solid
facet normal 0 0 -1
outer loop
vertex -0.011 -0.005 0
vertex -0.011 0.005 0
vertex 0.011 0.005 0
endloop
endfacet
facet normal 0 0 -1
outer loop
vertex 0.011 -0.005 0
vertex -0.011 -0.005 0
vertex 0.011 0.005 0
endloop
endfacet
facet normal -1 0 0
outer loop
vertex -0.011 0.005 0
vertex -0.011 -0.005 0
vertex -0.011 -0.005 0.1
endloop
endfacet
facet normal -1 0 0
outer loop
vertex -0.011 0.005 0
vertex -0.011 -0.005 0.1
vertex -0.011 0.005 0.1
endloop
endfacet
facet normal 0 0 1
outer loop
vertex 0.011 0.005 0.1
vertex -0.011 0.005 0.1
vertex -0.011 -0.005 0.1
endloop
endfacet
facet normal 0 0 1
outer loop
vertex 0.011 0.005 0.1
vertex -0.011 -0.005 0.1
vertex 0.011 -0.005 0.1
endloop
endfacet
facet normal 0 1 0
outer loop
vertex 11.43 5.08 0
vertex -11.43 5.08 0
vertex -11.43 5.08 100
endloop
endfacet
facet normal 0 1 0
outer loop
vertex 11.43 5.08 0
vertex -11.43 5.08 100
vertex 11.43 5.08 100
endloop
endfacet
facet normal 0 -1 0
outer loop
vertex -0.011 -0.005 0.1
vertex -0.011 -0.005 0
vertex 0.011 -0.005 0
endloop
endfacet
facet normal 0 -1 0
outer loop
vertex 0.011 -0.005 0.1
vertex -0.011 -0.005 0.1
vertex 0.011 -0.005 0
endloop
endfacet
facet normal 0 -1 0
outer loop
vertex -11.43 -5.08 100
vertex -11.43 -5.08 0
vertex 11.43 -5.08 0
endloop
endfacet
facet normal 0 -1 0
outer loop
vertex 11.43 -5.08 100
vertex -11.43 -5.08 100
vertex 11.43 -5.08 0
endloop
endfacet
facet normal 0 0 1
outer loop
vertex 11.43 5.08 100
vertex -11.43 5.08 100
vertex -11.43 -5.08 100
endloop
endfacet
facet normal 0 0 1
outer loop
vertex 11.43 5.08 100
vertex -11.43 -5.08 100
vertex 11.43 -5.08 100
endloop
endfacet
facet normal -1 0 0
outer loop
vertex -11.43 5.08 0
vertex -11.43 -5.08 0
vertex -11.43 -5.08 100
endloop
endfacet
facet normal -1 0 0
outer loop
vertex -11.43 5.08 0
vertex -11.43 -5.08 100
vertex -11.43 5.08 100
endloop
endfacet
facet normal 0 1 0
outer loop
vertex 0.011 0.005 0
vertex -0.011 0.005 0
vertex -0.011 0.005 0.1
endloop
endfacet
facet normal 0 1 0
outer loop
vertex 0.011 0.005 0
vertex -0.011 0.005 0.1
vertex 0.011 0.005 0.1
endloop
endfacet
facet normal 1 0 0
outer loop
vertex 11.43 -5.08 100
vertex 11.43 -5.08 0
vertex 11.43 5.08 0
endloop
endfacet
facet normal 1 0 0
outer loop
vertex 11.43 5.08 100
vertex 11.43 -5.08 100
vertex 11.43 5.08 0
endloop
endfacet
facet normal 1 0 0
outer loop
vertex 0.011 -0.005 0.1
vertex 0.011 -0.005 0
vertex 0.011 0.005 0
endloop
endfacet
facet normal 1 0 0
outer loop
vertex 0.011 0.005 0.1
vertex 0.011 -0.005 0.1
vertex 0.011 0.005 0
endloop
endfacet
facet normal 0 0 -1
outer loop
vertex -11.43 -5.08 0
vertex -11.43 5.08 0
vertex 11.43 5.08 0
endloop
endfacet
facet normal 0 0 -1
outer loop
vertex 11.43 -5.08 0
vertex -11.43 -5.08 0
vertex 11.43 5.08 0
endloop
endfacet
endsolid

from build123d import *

# Parameters (mm, degrees)
RECTANGLE_W       = 22.86
RECTANGLE_H       = 10.16
EXTRUDE_DEPTH     = 100
CLONE_SCALE_SCALE = 0.001


with BuildPart() as extrude_body:
    # Rectangle → Extrude (new body)
    with BuildSketch(Plane(origin=(-11.43, -5.08, 0), x_dir=(1, 0, 0), z_dir=(0, 0, 1))):
        with Locations((11.43, 5.08)):
            Rectangle(RECTANGLE_W, RECTANGLE_H)
    extrude(amount=EXTRUDE_DEPTH)


with BuildPart() as scaled:
    # Clone base: copy of Extrude body
    add(extrude_body.part)


with BuildPart() as scaled_1:
    # Clone scale: moved
    add(scaled.part.scale(CLONE_SCALE_SCALE))


solid = Compound([extrude_body.part, scaled_1.part])
